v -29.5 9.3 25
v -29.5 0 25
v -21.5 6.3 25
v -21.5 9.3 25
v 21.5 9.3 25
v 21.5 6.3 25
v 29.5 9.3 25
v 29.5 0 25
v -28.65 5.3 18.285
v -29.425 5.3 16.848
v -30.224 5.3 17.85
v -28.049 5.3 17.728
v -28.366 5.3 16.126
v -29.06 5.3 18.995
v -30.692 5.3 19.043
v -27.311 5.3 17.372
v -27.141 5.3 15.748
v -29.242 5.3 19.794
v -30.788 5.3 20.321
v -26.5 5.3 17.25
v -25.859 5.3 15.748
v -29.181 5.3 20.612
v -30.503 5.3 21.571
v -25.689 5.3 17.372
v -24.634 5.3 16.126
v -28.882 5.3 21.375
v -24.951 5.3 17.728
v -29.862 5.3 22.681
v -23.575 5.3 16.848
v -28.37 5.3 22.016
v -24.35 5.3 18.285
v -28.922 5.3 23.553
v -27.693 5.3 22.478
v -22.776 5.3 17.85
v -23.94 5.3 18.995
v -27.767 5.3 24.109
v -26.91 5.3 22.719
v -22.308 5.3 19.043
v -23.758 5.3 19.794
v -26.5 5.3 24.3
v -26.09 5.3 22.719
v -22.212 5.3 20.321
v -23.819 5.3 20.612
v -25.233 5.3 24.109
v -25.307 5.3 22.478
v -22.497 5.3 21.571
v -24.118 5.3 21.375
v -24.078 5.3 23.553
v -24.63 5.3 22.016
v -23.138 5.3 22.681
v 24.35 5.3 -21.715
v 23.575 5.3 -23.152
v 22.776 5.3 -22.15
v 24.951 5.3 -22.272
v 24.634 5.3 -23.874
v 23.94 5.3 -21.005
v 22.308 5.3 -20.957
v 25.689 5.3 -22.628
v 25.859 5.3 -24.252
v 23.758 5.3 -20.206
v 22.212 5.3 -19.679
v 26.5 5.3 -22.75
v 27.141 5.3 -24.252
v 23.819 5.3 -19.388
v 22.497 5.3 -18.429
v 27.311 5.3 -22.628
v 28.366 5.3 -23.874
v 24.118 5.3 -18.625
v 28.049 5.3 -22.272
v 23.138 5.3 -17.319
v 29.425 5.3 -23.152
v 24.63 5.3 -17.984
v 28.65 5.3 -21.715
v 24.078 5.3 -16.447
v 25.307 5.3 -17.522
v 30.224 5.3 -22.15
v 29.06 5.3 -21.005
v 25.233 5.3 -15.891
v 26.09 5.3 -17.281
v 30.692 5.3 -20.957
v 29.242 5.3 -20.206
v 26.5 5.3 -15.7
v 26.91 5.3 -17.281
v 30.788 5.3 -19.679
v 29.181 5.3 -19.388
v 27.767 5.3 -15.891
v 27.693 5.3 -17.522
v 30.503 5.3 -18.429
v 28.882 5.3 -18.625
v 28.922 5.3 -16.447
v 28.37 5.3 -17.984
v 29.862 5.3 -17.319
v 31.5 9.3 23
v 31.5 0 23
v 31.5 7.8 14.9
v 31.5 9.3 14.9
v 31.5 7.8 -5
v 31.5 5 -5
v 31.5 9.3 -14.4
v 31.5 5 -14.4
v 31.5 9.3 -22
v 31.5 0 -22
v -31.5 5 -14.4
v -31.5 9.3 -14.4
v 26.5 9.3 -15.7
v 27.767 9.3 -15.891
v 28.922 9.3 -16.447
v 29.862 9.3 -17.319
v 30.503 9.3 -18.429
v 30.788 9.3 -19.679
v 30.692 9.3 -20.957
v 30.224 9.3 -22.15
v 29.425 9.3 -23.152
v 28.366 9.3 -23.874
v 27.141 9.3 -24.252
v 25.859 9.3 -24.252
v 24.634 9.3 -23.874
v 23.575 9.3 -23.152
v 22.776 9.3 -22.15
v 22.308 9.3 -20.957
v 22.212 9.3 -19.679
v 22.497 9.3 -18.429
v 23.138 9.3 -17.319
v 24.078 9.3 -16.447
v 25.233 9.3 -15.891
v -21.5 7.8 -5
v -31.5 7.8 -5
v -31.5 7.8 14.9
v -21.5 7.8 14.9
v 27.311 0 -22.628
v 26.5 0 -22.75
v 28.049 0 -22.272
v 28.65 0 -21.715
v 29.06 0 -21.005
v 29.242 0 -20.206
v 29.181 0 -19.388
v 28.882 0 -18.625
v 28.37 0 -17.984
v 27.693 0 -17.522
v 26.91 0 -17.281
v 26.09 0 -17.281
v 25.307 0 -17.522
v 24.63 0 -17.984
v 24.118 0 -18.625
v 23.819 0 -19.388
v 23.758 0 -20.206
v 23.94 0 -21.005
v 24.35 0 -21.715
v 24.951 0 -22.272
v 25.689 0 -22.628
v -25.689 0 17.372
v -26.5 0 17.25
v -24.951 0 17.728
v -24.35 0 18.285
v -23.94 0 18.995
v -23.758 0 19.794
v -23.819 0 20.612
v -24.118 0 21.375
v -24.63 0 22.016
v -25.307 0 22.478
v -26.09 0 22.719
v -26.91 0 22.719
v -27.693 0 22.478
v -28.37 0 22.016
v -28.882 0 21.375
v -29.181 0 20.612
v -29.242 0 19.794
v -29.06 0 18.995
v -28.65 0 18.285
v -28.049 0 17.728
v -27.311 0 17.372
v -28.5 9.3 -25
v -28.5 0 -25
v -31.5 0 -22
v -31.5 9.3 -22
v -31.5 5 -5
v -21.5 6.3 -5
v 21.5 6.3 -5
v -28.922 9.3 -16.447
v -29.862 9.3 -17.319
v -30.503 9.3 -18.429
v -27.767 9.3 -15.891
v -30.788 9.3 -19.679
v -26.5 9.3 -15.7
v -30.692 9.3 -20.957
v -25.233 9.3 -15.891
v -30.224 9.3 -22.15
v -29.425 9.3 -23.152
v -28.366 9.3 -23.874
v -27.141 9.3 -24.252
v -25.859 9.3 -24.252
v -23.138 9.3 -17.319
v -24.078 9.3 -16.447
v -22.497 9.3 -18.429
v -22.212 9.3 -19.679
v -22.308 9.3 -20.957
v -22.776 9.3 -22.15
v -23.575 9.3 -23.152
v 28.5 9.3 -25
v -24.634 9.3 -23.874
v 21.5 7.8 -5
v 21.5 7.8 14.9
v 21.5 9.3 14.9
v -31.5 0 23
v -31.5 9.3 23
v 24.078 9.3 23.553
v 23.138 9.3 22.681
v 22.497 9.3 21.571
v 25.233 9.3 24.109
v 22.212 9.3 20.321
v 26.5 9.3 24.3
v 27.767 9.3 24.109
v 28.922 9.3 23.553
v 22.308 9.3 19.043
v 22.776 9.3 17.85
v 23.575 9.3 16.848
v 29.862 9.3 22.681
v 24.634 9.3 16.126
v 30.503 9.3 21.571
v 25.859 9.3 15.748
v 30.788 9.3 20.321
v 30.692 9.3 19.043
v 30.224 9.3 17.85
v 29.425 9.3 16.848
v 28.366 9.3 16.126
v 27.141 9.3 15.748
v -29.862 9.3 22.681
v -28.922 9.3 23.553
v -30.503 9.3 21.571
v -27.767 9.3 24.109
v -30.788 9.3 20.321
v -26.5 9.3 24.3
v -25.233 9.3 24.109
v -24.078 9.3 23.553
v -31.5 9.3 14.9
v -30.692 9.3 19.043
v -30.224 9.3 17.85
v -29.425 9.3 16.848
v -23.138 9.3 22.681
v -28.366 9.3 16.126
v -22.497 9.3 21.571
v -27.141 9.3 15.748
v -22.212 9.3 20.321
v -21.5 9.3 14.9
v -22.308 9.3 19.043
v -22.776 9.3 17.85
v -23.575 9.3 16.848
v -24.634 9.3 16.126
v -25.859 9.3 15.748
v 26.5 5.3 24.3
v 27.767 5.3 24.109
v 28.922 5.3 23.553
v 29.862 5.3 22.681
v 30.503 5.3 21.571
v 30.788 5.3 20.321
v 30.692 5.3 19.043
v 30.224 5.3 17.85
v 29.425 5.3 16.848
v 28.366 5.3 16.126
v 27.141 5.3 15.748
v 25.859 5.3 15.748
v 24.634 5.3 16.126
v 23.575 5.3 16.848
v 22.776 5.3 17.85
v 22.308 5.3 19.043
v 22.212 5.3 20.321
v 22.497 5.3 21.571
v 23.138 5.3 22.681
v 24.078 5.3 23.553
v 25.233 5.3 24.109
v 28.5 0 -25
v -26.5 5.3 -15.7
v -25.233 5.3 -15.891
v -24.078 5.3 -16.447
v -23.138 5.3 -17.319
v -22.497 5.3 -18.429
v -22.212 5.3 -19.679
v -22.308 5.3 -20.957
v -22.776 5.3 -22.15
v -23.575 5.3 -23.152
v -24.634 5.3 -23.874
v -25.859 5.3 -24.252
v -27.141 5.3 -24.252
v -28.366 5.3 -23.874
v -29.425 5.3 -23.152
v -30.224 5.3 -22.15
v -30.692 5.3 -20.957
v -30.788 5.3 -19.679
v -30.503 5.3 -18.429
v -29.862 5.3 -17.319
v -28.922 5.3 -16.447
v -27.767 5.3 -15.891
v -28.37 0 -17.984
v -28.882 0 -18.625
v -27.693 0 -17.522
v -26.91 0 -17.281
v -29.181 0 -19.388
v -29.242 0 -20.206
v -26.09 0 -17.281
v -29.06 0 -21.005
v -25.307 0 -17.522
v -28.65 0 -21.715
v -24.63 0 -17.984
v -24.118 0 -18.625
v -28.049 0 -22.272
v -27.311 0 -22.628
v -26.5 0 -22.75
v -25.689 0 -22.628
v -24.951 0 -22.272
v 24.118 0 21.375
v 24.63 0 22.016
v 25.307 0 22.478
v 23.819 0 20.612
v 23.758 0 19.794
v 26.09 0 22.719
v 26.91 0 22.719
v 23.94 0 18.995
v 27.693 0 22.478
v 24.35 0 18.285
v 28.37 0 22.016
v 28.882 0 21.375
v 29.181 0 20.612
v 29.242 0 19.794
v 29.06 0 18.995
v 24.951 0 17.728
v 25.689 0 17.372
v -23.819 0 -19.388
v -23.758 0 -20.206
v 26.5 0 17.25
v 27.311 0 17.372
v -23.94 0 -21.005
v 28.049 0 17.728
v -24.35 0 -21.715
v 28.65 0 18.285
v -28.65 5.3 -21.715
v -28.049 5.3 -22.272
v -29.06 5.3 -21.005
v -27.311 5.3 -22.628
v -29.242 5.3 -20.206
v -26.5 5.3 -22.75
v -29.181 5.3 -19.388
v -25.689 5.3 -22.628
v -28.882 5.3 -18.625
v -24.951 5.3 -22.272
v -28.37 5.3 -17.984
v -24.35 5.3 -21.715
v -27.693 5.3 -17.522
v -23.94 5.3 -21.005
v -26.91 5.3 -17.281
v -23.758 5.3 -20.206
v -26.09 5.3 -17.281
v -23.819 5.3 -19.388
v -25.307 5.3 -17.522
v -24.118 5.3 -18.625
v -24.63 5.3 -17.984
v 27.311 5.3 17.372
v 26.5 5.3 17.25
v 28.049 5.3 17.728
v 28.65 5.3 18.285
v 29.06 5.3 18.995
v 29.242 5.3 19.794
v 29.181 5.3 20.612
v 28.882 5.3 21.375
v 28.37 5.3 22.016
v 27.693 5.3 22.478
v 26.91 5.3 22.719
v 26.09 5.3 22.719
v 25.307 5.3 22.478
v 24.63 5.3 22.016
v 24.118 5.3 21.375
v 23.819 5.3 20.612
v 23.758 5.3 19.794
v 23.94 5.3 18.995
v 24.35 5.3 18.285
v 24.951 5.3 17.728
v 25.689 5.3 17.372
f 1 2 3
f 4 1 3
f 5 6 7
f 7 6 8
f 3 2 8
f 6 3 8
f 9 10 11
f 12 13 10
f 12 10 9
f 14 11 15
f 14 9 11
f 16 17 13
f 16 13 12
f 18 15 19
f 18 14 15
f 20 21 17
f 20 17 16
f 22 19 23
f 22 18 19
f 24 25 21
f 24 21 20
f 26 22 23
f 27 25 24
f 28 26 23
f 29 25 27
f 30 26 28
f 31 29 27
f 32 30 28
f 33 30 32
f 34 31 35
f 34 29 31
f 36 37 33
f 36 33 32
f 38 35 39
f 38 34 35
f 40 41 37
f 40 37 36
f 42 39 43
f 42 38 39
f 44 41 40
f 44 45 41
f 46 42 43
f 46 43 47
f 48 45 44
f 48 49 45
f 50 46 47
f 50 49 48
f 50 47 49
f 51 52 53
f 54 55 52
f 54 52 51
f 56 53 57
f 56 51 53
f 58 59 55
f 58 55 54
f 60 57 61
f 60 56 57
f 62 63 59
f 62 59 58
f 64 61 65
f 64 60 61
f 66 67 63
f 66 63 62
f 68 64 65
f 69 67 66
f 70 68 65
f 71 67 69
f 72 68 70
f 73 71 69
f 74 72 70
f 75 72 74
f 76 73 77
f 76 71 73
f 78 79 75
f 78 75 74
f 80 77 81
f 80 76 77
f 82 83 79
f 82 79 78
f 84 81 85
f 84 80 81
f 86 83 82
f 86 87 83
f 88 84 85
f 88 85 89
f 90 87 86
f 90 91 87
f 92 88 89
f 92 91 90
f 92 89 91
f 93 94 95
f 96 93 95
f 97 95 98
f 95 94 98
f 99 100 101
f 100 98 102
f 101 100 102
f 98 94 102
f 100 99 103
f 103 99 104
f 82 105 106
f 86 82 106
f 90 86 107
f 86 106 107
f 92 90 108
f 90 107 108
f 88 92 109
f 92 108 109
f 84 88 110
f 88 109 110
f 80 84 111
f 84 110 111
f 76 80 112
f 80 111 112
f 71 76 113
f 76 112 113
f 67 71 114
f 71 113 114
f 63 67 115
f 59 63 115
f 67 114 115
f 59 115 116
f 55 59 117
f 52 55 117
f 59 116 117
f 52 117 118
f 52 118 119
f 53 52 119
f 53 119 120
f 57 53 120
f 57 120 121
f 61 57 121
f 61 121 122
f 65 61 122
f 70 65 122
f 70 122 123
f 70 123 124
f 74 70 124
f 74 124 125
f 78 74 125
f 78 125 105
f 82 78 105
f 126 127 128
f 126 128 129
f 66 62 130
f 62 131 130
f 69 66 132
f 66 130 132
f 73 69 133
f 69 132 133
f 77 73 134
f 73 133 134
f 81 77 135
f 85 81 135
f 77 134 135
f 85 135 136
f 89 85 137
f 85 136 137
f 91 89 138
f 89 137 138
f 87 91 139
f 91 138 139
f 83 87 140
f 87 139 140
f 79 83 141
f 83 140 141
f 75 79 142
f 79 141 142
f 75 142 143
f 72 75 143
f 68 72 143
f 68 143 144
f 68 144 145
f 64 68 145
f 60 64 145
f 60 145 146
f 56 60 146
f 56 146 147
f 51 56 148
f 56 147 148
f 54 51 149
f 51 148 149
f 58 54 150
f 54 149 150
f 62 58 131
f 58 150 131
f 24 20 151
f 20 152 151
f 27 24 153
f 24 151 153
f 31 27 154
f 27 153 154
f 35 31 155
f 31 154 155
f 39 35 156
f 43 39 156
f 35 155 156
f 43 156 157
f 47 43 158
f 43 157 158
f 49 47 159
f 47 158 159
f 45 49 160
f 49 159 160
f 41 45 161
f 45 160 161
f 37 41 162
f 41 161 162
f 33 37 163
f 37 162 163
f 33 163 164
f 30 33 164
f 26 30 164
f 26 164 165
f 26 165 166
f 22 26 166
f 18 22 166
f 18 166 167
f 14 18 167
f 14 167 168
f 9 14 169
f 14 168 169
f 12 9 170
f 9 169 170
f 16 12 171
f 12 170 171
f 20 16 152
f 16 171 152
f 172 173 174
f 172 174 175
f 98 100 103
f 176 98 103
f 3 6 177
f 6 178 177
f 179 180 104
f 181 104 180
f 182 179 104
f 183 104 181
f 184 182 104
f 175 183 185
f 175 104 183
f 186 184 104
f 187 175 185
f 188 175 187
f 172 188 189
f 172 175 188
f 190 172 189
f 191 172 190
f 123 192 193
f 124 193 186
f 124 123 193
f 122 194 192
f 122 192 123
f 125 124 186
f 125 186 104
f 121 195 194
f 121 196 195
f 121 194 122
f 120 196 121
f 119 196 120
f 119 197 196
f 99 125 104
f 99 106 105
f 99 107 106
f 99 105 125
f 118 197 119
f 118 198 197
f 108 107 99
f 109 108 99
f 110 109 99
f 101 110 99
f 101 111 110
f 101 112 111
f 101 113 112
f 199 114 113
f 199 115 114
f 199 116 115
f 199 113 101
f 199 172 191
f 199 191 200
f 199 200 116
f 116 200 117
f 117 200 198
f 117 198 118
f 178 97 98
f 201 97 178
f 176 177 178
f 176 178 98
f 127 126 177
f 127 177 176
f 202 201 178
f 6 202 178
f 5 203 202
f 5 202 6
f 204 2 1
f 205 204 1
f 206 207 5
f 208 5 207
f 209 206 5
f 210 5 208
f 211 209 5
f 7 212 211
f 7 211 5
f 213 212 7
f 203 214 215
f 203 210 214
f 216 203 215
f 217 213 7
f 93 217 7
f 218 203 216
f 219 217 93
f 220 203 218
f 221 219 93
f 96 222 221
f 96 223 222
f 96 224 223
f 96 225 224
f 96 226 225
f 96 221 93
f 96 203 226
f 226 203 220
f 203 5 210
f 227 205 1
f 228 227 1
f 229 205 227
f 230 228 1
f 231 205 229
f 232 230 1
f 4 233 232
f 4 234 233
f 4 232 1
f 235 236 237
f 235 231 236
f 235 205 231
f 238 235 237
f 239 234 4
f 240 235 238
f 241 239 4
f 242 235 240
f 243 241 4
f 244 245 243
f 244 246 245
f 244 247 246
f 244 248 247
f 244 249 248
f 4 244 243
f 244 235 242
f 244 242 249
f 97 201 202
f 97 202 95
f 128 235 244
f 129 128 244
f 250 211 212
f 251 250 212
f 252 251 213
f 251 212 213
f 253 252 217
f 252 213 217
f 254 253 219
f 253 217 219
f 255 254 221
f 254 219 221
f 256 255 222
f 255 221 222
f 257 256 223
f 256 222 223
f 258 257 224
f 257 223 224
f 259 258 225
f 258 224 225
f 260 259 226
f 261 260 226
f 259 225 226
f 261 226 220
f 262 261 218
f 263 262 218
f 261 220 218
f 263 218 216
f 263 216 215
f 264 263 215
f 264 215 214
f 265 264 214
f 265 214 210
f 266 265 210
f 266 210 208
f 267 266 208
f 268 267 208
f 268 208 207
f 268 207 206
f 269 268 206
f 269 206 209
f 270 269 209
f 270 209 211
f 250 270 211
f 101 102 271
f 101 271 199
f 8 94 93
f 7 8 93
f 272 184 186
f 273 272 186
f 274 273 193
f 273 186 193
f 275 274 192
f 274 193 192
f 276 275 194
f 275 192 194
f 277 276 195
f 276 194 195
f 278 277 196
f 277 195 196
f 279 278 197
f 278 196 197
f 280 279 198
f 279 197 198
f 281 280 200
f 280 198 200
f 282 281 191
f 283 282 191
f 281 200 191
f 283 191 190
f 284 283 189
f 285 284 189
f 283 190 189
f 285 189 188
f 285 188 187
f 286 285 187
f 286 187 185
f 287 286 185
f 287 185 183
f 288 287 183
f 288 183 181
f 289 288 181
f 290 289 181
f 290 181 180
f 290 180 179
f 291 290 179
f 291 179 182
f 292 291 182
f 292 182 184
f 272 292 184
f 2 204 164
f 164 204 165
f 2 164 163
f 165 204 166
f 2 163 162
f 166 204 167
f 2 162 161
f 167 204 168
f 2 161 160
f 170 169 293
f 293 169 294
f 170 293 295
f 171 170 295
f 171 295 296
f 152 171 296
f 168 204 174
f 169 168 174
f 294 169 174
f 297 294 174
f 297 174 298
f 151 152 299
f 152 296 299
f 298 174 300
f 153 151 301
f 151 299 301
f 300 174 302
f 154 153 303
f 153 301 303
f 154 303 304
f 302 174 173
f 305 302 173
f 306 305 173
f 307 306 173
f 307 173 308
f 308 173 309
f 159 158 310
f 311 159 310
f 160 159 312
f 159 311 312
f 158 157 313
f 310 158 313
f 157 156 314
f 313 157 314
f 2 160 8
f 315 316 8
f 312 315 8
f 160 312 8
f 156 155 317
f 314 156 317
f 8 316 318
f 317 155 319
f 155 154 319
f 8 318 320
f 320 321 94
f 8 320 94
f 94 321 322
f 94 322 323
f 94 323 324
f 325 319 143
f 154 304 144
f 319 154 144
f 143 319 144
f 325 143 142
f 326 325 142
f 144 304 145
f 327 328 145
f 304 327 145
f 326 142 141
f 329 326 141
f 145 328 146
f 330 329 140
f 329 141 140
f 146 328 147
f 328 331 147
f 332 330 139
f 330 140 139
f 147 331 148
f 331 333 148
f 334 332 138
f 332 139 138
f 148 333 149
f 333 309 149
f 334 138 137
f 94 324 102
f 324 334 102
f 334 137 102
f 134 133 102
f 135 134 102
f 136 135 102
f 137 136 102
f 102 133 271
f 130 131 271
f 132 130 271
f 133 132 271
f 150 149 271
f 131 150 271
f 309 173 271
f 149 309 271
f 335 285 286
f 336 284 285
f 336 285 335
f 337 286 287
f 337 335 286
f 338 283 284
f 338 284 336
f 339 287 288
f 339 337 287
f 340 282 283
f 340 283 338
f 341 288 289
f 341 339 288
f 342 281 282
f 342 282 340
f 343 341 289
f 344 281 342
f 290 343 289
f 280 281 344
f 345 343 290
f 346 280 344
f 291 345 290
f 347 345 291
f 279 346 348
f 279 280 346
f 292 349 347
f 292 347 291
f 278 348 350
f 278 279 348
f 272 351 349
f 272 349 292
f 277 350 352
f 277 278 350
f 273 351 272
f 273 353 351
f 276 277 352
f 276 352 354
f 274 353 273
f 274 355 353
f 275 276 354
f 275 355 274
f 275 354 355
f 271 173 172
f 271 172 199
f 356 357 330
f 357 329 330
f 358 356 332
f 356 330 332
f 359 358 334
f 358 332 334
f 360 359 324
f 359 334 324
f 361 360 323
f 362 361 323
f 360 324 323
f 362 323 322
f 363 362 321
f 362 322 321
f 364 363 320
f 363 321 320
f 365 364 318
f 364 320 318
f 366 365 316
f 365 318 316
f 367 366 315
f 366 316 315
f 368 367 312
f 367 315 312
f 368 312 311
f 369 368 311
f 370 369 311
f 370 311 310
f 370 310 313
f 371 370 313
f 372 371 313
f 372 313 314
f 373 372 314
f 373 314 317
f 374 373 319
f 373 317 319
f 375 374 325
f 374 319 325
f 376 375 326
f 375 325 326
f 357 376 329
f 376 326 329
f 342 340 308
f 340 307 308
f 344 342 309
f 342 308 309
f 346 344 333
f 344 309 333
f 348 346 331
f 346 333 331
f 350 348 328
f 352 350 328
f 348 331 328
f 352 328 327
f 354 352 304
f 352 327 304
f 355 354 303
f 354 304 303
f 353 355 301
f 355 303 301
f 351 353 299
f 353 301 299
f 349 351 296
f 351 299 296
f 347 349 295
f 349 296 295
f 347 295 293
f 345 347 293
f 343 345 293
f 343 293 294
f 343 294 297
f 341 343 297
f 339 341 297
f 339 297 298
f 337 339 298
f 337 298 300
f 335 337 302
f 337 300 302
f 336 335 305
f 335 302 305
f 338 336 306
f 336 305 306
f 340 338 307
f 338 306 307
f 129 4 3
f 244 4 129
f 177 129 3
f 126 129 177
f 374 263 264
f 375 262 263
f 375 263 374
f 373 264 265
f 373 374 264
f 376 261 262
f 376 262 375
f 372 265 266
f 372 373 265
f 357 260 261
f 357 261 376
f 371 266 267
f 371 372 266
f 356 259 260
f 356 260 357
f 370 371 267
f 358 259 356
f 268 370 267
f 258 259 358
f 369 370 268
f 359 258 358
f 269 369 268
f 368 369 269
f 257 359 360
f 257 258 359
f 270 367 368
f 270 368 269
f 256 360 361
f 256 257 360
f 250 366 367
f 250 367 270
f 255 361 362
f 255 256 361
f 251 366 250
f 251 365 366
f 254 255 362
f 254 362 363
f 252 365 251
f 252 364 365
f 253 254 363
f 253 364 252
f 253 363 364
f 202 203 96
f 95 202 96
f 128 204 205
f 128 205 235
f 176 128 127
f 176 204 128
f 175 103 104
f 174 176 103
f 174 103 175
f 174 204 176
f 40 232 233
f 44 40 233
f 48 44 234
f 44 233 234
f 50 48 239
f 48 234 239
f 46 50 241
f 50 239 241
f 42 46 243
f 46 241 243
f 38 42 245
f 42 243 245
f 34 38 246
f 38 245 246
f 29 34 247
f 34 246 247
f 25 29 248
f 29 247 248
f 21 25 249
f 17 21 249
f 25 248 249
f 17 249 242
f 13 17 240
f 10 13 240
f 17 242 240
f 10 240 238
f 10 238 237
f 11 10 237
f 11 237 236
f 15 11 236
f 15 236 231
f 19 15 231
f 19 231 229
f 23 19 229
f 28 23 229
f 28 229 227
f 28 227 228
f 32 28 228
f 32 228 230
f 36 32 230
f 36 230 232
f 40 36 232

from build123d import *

# Parameters (mm, degrees)
SKETCH1_W                                           = 63
SKETCH1_H                                           = 50
BOSS_EXTRUDE1_DEPTH                                 = 9.3
CBORE_FOR_M5_HEX_SOCKET_HEAD_CAP_SCREW2_D           = 5.5
CBORE_FOR_M5_HEX_SOCKET_HEAD_CAP_SCREW2_CBORE_D     = 8.6
CBORE_FOR_M5_HEX_SOCKET_HEAD_CAP_SCREW2_CBORE_DEPTH = 4
CHAMFER1_SIZE                                       = 3
CHAMFER2_SIZE                                       = 2
CUT_EXTRUDE1_DEPTH                                  = 3
CUT_EXTRUDE2_DEPTH                                  = 4.3
SKETCH8_W                                           = 10
SKETCH8_H                                           = 19.9
CUT_EXTRUDE3_DEPTH                                  = 1.5


with BuildPart() as part:
    # Sketch1 → Boss-Extrude1 (new body)
    with BuildSketch(Plane(origin=(0, 0, 0), x_dir=(1, 0, 0), z_dir=(0, 1, 0))):
        Rectangle(SKETCH1_W, SKETCH1_H)
    extrude(amount=BOSS_EXTRUDE1_DEPTH)

    # CBORE for M5 Hex Socket Head Cap Screw2 (through all)
    with Locations(Plane(origin=(-26.5, 9.3, 20), x_dir=(0, 0, 1), z_dir=(0, 1, 0))):
        with Locations((0, 0), (0, 53), (-40, 53), (-40, 0)):
            CounterBoreHole(CBORE_FOR_M5_HEX_SOCKET_HEAD_CAP_SCREW2_D / 2, CBORE_FOR_M5_HEX_SOCKET_HEAD_CAP_SCREW2_CBORE_D / 2, CBORE_FOR_M5_HEX_SOCKET_HEAD_CAP_SCREW2_CBORE_DEPTH)

    # Chamfer1
    chamfer1_edges = [part.edges().sort_by_distance(p)[0] for p in [
        (-31.5, 4.65, -25),
        (31.5, 4.65, -25),
    ]]
    chamfer(chamfer1_edges, length=CHAMFER1_SIZE)

    # Chamfer2
    chamfer2_edges = [part.edges().sort_by_distance(p)[0] for p in [
        (31.5, 4.65, 25),
        (-31.5, 4.65, 25),
    ]]
    chamfer(chamfer2_edges, length=CHAMFER2_SIZE)

    # Sketch5 → Cut-Extrude1 (cut)
    with BuildSketch(Plane(origin=(0, 9.3, 0), x_dir=(1, 0, 0), z_dir=(0, 1, 0))):
        Polygon((0, -25), (-21.5, -25), (-21.5, 14.4), (21.5, 14.4), (21.5, -25), align=None)
    extrude(amount=-CUT_EXTRUDE1_DEPTH, mode=Mode.SUBTRACT)

    # Sketch7 → Cut-Extrude2 (cut)
    with BuildSketch(Plane(origin=(0, 9.3, 0), x_dir=(1, 0, 0), z_dir=(0, 1, 0))):
        Polygon((-21.5, 14.4), (31.5, 14.4), (31.5, 5), (-31.5, 5), (-31.5, 14.4), align=None)
    extrude(amount=-CUT_EXTRUDE2_DEPTH, mode=Mode.SUBTRACT)

    # Sketch8 → Cut-Extrude3 (cut)
    with BuildSketch(Plane(origin=(0, 9.3, 0), x_dir=(1, 0, 0), z_dir=(0, 1, 0))):
        with Locations((26.5, -4.95)):
            Rectangle(SKETCH8_W, SKETCH8_H)
        with Locations((-26.5, -4.95)):
            Rectangle(SKETCH8_W, SKETCH8_H)
    extrude(amount=-CUT_EXTRUDE3_DEPTH, mode=Mode.SUBTRACT)


solid = part.part
